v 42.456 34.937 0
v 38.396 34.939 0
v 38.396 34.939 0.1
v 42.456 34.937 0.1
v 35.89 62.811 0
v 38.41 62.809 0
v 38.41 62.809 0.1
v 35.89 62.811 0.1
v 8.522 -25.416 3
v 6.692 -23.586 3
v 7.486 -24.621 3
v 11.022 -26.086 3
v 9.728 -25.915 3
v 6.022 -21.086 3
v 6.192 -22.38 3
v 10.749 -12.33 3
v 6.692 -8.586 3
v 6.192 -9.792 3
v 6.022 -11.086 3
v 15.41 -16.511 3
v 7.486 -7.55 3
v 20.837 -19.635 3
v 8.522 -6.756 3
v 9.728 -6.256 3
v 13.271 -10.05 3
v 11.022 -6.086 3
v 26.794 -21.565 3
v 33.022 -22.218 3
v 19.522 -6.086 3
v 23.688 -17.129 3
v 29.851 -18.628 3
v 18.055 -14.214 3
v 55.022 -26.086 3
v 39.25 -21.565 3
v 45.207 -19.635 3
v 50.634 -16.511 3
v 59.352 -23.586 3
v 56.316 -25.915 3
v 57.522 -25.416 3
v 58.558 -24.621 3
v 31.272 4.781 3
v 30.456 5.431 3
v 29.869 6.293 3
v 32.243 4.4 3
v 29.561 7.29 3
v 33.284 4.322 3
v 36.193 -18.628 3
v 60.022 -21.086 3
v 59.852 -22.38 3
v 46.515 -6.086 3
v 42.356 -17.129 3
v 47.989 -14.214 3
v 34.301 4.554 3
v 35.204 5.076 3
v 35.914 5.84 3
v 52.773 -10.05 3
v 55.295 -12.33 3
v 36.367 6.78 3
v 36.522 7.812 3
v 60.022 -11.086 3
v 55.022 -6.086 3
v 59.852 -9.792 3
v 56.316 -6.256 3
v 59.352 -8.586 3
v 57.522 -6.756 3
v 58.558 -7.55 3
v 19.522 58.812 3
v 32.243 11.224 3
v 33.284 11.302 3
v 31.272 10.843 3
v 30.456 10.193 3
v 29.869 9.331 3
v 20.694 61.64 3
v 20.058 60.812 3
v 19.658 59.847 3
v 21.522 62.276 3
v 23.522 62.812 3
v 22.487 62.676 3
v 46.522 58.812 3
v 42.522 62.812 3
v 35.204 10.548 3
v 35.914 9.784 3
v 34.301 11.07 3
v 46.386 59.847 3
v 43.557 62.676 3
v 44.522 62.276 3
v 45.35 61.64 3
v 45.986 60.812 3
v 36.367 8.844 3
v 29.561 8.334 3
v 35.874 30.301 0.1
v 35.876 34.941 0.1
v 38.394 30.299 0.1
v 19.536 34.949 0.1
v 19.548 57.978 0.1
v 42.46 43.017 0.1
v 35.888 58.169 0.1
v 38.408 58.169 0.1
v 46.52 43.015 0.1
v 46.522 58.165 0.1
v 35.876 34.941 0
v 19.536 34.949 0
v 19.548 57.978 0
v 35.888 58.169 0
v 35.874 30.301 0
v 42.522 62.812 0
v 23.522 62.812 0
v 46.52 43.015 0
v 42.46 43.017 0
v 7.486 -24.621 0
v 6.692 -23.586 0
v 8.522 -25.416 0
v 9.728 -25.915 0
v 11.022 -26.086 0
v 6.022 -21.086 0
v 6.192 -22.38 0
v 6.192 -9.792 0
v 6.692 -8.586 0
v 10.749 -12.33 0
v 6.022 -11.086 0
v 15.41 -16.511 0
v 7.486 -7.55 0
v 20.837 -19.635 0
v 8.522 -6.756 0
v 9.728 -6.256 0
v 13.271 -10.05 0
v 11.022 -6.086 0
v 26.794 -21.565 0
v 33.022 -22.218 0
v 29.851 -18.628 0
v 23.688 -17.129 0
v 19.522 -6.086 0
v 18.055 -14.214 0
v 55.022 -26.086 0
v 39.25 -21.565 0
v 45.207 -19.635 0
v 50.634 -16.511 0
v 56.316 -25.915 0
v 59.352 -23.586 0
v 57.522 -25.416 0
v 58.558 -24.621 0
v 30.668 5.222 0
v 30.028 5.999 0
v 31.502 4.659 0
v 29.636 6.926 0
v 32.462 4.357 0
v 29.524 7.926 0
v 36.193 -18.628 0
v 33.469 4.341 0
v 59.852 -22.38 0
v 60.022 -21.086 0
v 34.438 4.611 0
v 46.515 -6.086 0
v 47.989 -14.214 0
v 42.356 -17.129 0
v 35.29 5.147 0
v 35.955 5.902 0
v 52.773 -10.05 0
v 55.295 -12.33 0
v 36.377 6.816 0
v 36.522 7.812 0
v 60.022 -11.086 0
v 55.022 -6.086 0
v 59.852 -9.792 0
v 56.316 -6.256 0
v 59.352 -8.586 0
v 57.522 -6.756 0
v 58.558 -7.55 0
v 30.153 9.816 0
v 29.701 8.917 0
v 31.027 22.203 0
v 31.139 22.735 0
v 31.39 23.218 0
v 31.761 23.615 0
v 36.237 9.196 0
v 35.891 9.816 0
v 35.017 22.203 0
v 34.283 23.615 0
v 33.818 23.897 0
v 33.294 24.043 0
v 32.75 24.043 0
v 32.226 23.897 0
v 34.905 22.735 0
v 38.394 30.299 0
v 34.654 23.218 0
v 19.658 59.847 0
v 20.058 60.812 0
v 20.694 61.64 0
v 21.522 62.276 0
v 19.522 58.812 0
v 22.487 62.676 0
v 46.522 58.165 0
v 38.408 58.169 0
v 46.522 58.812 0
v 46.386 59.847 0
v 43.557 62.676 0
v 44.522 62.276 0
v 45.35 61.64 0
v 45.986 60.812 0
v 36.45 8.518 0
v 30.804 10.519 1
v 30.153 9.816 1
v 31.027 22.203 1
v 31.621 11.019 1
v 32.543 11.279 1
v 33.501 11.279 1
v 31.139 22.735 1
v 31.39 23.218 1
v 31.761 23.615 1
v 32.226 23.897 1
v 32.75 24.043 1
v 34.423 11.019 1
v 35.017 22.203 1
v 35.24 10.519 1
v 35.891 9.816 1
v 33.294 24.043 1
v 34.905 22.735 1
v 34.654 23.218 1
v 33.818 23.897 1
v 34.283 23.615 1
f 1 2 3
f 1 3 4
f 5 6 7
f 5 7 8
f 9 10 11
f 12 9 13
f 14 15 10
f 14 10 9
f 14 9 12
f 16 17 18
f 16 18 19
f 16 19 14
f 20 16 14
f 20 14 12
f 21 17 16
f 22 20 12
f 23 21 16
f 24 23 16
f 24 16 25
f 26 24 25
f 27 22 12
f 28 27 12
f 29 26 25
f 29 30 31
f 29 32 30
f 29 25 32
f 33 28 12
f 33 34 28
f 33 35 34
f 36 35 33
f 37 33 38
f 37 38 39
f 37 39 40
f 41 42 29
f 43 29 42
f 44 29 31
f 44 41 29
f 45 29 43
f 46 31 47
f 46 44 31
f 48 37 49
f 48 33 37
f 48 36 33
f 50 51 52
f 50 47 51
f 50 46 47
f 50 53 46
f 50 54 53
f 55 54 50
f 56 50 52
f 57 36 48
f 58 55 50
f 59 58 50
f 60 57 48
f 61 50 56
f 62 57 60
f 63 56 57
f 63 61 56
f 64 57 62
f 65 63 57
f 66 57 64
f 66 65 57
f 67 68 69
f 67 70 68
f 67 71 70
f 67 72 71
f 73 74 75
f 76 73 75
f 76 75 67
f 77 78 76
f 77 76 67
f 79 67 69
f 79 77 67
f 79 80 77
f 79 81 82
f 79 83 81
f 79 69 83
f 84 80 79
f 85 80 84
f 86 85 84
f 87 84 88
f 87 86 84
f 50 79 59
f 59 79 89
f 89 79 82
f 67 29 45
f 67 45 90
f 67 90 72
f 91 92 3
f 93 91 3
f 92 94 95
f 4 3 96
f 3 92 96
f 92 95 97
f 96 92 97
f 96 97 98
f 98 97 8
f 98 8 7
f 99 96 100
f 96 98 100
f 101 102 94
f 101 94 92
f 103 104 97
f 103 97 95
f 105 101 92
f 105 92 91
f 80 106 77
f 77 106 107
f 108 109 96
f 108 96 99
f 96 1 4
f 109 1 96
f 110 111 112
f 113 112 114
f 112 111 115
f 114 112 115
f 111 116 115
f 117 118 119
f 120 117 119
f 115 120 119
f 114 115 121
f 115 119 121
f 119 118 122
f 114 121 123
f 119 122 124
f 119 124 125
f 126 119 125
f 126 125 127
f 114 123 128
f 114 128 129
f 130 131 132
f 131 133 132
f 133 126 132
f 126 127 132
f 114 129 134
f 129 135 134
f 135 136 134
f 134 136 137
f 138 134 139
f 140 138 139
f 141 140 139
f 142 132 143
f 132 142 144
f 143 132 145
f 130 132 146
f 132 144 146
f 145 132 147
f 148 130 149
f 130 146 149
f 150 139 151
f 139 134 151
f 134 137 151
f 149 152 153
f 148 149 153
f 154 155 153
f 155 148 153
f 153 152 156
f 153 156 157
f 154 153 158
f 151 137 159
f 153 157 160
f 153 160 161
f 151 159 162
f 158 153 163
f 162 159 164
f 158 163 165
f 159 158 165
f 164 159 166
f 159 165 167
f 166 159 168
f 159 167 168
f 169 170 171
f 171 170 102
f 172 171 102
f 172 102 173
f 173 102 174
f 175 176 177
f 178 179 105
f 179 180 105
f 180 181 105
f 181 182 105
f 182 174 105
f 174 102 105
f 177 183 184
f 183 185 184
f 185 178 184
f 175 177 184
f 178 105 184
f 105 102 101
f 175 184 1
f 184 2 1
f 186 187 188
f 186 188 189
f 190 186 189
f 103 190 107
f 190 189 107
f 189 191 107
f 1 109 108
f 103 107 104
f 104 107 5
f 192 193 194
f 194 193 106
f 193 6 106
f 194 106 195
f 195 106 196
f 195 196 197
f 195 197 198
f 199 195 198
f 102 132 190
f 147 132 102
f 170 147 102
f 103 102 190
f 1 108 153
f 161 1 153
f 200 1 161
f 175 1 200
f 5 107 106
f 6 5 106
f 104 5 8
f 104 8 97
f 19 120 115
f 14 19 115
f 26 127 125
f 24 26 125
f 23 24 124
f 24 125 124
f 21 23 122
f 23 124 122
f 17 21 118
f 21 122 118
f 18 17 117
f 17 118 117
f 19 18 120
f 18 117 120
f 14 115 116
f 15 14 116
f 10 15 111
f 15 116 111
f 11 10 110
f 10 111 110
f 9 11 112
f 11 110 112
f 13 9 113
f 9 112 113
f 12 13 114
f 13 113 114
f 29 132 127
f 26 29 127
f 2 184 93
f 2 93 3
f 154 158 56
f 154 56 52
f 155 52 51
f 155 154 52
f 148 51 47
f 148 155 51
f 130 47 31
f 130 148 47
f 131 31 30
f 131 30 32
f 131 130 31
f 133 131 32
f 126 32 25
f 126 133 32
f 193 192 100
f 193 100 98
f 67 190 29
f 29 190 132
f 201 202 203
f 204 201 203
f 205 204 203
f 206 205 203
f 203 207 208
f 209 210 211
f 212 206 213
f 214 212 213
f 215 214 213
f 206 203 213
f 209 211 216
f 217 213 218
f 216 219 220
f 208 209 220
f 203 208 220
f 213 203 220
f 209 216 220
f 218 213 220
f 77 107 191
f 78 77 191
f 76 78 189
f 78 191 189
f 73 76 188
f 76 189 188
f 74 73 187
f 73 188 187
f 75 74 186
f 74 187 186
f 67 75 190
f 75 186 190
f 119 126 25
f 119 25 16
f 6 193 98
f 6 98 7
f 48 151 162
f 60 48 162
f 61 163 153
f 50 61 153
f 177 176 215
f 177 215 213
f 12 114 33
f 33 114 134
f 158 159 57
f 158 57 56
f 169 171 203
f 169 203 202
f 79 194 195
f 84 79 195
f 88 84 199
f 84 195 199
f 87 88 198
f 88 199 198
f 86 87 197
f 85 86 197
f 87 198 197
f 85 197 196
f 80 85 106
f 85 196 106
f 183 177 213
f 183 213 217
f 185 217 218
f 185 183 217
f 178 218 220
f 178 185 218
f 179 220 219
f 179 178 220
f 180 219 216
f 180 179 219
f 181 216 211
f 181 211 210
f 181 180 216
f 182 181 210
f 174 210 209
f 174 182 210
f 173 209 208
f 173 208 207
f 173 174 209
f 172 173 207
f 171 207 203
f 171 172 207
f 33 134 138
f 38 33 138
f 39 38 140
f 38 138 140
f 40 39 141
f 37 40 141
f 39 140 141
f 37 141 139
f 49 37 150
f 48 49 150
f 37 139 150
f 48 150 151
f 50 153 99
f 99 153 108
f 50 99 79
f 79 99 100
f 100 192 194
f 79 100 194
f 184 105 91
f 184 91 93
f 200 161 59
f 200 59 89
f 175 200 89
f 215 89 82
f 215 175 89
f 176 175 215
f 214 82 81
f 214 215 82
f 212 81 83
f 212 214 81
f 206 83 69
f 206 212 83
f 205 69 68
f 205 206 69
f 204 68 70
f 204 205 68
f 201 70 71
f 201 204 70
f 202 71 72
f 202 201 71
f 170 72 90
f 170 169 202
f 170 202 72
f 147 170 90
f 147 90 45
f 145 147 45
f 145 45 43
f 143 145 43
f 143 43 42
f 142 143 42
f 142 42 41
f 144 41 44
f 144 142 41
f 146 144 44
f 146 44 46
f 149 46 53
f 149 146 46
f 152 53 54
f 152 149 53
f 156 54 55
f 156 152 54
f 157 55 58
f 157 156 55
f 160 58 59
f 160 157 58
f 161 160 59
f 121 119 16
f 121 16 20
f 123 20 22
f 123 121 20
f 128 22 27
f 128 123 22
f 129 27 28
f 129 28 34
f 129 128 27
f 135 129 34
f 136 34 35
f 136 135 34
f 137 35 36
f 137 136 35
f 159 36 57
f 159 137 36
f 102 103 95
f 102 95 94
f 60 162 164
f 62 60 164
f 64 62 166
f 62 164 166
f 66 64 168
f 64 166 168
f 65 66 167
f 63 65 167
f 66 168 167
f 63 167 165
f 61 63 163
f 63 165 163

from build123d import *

# Parameters (mm, degrees)
CORTE_EXTERIOR_R        = 3.500001168
SALIENTE_EXTRUIR1_DEPTH = 3
CORTAR_EXTRUIR1_DEPTH   = 1
CORTAR_EXTRUIR2_DEPTH   = 0.1


with BuildPart() as part:
    # Corte exterior → Saliente-Extruir1 (new body)
    with BuildSketch(Plane.XY):
        with BuildLine():
            Line((19.521996462, -6.085833738), (11.021996462, -6.085833738))
            ThreePointArc((11.021996462, -6.085833738), (7.486462556, -7.550299832), (6.021996462, -11.085833738))
            Line((6.021996462, -11.085833738), (6.021996462, -21.085833738))
            ThreePointArc((6.021996462, -21.085833738), (7.486462556, -24.621367644), (11.021996462, -26.085833738))
            Line((11.021996462, -26.085833738), (55.021996462, -26.085833738))
            ThreePointArc((55.021996462, -26.085833738), (58.557530368, -24.621367644), (60.021996462, -21.085833738))
            Line((60.021996462, -21.085833738), (60.021996462, -11.085833738))
            ThreePointArc((60.021996462, -11.085833738), (58.557530368, -7.550299832), (55.021996462, -6.085833738))
            Line((55.021996462, -6.085833738), (46.514841363, -6.085833738))
            Line((46.514841363, -6.085833738), (46.521996462, 58.812041738))
            ThreePointArc((46.521996462, 58.812041738), (45.350423587, 61.640468863), (42.521996462, 62.812041738))
            Line((42.521996462, 62.812041738), (23.521996462, 62.812041738))
            ThreePointArc((23.521996462, 62.812041738), (20.693569337, 61.640468863), (19.521996462, 58.812041738))
            Line((19.521996462, 58.812041738), (19.521996462, -6.085833738))
        make_face()
        with Locations((33.021996462, 7.812041474)):
            Circle(CORTE_EXTERIOR_R, mode=Mode.SUBTRACT)
        with BuildLine():
            Line((55.29494797, -12.330366391), (52.77320204, -10.049840692))
            ThreePointArc((52.77320204, -10.049840692), (33.021996462, -18.817961696), (13.270789317, -10.049842109))
            Line((13.270789317, -10.049842109), (10.749043386, -12.330367808))
            ThreePointArc((10.749043386, -12.330367808), (33.021996462, -22.217961696), (55.29494797, -12.330366391))
        make_face(mode=Mode.SUBTRACT)
    extrude(amount=SALIENTE_EXTRUIR1_DEPTH)

    # Grabado Superficie → Cortar-Extruir1 (cut)
    with BuildSketch(Plane.XY):
        with BuildLine():
            Line((35.89134848, 9.816243852), (35.017032688, 22.202862127))
            ThreePointArc((35.017032688, 22.202862127), (33.021996462, 24.062041474), (31.026960236, 22.202862127))
            Line((31.026960236, 22.202862127), (30.152644444, 9.816243852))
            ThreePointArc((30.152644444, 9.816243852), (33.021996462, 11.312042642), (35.89134848, 9.816243852))
        make_face()
    extrude(amount=CORTAR_EXTRUIR1_DEPTH, mode=Mode.SUBTRACT)

    # grabado linea medio → Cortar-Extruir2 (cut)
    with BuildSketch(Plane.XY):
        Polygon((42.460122518, 43.017187336), (46.540121977, 43.015086813), (46.547921712, 58.165084805), (38.407922791, 58.169275554), (38.41031162, 62.809274939), (35.890311954, 62.810572321), (35.887922498, 58.169356436), (19.547821697, 57.977768849), (19.535965697, 34.948988401), (35.875963531, 34.940576014), (35.873574702, 30.300576629), (38.393574368, 30.299279247), (38.395963198, 34.939278632), (42.455962659, 34.937188407), align=None)
    extrude(amount=CORTAR_EXTRUIR2_DEPTH, mode=Mode.SUBTRACT)


solid = part.part
